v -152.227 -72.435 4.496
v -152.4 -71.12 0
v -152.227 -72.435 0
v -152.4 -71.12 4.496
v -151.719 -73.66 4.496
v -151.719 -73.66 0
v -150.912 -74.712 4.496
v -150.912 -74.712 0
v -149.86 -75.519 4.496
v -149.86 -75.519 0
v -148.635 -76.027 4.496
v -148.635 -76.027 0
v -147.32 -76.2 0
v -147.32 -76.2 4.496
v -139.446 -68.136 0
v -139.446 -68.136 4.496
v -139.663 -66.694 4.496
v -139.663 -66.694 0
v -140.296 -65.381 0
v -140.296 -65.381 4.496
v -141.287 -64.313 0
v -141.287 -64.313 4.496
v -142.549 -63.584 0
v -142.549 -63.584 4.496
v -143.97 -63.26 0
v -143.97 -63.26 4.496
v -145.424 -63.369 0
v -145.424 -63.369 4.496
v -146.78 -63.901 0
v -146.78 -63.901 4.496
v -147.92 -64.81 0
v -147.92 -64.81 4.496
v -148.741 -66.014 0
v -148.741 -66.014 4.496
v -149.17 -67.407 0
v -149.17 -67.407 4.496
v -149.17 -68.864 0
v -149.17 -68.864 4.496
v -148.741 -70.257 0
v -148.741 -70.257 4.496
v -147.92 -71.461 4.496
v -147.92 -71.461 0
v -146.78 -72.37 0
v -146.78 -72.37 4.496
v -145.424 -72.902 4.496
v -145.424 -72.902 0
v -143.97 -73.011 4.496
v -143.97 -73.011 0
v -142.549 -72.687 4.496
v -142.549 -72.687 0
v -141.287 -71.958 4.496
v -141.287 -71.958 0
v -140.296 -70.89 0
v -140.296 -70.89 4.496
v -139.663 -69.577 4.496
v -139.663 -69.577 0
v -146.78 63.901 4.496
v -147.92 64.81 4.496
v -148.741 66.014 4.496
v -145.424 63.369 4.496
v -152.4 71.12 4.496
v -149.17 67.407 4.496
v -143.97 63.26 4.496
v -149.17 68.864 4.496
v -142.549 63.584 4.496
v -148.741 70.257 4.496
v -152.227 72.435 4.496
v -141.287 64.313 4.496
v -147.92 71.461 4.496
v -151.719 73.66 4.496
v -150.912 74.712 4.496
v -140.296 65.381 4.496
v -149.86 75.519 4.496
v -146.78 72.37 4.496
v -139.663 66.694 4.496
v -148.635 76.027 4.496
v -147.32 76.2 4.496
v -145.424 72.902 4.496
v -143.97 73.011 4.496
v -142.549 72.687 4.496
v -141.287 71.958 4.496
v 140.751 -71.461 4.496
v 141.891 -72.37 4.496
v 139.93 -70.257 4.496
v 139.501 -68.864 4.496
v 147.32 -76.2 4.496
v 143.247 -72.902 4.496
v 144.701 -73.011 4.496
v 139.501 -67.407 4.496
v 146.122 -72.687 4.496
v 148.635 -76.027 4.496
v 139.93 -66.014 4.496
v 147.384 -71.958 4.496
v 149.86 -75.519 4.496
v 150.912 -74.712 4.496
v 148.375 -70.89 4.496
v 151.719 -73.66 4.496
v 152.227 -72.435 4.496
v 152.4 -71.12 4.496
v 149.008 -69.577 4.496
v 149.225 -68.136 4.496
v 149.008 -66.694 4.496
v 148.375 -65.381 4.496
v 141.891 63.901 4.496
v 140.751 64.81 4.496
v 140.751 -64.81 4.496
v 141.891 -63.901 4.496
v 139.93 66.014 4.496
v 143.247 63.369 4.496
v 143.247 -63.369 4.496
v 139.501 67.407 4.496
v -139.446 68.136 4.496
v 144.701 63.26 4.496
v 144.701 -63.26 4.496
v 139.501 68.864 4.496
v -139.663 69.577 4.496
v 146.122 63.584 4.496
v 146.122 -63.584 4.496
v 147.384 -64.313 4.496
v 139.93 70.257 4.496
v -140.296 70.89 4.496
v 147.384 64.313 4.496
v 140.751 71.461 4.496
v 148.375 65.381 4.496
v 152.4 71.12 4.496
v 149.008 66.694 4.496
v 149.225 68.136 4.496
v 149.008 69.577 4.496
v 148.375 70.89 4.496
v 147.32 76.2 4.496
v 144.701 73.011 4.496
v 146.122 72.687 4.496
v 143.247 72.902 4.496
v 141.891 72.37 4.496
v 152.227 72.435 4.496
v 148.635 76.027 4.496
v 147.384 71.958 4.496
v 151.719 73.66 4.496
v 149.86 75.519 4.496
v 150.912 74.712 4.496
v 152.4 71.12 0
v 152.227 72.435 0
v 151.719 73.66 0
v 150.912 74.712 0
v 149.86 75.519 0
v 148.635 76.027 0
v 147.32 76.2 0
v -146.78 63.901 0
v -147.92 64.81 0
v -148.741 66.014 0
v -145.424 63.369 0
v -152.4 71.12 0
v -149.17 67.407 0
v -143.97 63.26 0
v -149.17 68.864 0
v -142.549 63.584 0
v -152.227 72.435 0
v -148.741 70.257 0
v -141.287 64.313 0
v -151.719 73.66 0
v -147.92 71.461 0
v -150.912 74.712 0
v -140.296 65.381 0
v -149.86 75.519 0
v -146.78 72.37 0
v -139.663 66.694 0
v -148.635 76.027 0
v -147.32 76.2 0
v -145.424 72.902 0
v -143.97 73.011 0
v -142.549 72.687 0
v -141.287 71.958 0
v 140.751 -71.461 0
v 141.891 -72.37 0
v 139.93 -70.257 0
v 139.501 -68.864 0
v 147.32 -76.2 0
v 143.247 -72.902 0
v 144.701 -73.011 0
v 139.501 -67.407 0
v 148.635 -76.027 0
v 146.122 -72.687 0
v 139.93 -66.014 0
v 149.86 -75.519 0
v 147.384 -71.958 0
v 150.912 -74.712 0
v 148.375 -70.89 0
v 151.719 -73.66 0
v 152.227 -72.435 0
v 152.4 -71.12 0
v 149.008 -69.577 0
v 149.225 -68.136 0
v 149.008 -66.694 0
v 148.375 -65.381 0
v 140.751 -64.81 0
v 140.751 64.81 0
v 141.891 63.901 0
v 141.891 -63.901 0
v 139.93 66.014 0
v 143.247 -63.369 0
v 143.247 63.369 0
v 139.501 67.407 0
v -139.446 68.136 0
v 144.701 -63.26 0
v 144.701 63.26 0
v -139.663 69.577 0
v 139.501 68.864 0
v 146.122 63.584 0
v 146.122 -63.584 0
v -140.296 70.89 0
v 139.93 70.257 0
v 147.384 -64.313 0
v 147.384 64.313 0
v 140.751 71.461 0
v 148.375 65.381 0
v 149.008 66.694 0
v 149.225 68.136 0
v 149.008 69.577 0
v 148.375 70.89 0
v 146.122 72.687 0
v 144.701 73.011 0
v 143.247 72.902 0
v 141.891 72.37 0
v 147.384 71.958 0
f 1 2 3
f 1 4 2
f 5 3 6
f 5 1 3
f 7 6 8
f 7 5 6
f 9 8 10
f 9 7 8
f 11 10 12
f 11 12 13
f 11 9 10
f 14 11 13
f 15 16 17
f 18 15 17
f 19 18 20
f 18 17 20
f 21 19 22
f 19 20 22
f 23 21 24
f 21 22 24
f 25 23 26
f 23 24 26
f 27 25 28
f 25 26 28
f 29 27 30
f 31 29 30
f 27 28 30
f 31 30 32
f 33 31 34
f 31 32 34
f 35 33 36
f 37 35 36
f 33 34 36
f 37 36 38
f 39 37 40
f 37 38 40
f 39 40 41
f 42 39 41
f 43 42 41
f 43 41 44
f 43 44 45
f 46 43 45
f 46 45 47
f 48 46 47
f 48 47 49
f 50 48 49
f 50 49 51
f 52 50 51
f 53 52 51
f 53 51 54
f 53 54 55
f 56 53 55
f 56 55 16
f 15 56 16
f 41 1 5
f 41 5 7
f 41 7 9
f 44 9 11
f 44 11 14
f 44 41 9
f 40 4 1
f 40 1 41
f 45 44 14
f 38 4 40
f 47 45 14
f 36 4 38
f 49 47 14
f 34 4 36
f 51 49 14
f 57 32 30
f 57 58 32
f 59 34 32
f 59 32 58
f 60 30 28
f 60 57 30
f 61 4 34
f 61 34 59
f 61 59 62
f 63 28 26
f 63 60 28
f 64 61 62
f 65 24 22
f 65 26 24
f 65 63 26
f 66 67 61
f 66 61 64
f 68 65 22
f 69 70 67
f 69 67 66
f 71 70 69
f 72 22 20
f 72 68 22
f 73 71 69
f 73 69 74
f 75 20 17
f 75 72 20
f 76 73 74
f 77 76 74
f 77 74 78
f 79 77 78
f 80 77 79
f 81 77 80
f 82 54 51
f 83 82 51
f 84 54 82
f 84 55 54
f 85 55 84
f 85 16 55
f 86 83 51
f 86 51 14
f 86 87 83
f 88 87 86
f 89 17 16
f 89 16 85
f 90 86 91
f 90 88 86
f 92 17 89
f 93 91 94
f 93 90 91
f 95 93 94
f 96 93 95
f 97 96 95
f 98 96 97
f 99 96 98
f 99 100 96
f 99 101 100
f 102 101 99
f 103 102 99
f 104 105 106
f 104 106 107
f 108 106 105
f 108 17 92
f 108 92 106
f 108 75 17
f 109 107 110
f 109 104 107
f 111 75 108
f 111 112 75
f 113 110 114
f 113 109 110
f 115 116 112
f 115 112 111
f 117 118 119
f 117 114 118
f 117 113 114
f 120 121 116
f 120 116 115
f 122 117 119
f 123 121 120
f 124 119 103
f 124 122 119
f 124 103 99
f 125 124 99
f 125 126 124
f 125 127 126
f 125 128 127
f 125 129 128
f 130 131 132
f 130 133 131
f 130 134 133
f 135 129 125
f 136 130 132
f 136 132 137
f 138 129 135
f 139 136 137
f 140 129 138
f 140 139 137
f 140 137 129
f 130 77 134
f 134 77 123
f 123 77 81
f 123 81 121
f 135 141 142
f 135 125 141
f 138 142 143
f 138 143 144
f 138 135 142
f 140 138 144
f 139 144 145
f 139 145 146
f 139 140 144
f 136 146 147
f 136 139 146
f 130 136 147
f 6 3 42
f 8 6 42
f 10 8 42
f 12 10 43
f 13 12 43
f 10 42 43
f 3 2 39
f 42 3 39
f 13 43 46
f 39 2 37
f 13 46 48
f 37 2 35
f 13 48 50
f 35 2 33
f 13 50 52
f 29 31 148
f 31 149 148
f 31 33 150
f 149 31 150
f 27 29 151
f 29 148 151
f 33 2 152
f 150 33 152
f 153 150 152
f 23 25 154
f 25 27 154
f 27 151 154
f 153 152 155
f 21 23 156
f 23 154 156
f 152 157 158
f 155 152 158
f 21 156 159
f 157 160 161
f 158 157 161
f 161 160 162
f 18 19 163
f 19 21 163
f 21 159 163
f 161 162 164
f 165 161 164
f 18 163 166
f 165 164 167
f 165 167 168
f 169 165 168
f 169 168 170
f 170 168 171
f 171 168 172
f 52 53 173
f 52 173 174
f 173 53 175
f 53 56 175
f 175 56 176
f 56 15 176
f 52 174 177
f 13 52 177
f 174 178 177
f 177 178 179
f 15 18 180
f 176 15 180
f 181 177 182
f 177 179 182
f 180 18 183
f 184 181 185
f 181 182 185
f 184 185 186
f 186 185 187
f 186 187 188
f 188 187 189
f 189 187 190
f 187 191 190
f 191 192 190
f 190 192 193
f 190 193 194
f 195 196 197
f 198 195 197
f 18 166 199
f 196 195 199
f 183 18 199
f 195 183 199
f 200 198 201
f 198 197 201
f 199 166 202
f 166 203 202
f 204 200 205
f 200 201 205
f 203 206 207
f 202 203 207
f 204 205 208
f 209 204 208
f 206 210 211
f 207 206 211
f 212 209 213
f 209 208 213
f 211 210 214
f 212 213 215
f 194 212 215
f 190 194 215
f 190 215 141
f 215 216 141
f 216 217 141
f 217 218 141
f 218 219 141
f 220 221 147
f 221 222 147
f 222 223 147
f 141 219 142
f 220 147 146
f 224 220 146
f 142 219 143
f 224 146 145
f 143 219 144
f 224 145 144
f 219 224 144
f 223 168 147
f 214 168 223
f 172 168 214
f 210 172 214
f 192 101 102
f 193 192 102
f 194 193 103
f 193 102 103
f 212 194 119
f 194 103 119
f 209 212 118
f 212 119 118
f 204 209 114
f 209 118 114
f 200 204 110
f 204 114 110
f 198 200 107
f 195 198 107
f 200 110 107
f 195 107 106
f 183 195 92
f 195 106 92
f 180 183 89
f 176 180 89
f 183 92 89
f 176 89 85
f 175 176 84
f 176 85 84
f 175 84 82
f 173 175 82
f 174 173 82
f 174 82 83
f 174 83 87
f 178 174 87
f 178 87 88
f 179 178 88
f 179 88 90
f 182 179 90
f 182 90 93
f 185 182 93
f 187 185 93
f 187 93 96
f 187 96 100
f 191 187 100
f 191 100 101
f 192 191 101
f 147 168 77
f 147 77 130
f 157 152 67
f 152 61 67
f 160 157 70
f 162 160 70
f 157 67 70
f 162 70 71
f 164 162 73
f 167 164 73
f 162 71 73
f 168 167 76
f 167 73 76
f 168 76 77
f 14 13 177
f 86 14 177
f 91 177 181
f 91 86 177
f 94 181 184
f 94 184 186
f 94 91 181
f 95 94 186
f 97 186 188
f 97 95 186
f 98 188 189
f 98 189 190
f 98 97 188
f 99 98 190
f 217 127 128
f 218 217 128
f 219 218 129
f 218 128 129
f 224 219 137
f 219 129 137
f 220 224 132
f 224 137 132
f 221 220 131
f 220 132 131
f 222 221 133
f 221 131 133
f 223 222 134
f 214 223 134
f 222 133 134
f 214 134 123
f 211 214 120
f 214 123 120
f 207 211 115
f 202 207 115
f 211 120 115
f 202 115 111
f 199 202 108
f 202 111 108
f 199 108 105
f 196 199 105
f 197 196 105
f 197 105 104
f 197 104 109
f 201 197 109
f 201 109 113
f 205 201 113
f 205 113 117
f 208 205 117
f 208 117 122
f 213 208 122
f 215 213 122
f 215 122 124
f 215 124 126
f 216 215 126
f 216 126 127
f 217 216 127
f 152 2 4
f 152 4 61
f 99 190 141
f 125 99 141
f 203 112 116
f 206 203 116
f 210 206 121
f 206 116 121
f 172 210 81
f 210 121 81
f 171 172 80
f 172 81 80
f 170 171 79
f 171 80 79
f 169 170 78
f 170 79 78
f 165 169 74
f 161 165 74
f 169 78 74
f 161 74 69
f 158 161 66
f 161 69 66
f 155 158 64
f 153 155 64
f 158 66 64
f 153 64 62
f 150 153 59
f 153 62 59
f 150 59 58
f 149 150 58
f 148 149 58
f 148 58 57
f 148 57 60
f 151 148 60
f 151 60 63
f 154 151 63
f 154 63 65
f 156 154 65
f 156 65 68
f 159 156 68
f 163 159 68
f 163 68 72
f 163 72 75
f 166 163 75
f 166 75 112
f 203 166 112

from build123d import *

# Parameters (mm, degrees)
F0_W     = 304.8
F0_H     = 152.4
F1_DEPTH = 4.4958
F2_R     = 5.08
F3_R     = 4.8895
F4_DEPTH = 4.4968


with BuildPart() as f1:
    # F0 (on Top) → F1 (new body)
    with BuildSketch(Plane.XY):
        Rectangle(F0_W, F0_H)
    extrude(amount=F1_DEPTH)

    # F2
    f2_edges = [f1.edges().sort_by_distance(p)[0] for p in [
        (-152.4, 76.2, 2.2479),
        (-152.4, -76.2, 2.2479),
        (152.4, -76.2, 2.2479),
        (152.4, 76.2, 2.2479),
    ]]
    fillet(f2_edges, radius=F2_R)

    # F3 (on face) → F4 (cut, through all)
    with BuildSketch(Plane.XY.offset(4.4958)):
        with Locations((-144.3355, 68.1355)):
            Circle(F3_R)
        with Locations((144.3355, 68.1355)):
            Circle(F3_R)
        with Locations((144.3355, -68.1355)):
            Circle(F3_R)
        with Locations((-144.3355, -68.1355)):
            Circle(F3_R)
    extrude(amount=-F4_DEPTH, mode=Mode.SUBTRACT)


solid = f1.part
